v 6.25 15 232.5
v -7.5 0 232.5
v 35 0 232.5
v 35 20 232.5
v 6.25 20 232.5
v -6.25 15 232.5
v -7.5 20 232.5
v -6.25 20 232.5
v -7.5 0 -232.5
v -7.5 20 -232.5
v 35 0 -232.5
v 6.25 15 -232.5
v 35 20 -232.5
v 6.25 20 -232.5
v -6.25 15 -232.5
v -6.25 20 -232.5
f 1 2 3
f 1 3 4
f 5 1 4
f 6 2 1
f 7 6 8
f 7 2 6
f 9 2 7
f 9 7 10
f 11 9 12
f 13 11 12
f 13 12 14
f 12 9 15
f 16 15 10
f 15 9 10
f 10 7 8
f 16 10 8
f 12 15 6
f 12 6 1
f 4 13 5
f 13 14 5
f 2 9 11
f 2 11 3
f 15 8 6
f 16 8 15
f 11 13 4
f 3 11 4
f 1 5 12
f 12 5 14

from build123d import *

# Parameters (mm, degrees)
SKETCH1_W           = 15
SKETCH1_H           = 465
BOSS_EXTRUDE1_DEPTH = 20
SKETCH2_W           = 12.5
SKETCH2_H           = 465
CUT_EXTRUDE1_DEPTH  = 5
SKETCH4_W           = 465
SKETCH4_H           = 20
BOSS_EXTRUDE3_DEPTH = 27.5


with BuildPart() as part:
    # Sketch1 → Boss-Extrude1 (new body)
    with BuildSketch(Plane(origin=(0, 0, 0), x_dir=(1, 0, 0), z_dir=(0, 1, 0))):
        Rectangle(SKETCH1_W, SKETCH1_H)
    extrude(amount=BOSS_EXTRUDE1_DEPTH)

    # Sketch2 → Cut-Extrude1 (cut)
    with BuildSketch(Plane(origin=(0, 20, 0), x_dir=(1, 0, 0), z_dir=(0, 1, 0))):
        Rectangle(SKETCH2_W, SKETCH2_H)
    extrude(amount=-CUT_EXTRUDE1_DEPTH, mode=Mode.SUBTRACT)

    # Sketch4 → Boss-Extrude3 (add)
    with BuildSketch(Plane.ZY.offset(-7.5)):
        with Locations((0, 10)):
            Rectangle(SKETCH4_W, SKETCH4_H)
    extrude(amount=-BOSS_EXTRUDE3_DEPTH)


solid = part.part
